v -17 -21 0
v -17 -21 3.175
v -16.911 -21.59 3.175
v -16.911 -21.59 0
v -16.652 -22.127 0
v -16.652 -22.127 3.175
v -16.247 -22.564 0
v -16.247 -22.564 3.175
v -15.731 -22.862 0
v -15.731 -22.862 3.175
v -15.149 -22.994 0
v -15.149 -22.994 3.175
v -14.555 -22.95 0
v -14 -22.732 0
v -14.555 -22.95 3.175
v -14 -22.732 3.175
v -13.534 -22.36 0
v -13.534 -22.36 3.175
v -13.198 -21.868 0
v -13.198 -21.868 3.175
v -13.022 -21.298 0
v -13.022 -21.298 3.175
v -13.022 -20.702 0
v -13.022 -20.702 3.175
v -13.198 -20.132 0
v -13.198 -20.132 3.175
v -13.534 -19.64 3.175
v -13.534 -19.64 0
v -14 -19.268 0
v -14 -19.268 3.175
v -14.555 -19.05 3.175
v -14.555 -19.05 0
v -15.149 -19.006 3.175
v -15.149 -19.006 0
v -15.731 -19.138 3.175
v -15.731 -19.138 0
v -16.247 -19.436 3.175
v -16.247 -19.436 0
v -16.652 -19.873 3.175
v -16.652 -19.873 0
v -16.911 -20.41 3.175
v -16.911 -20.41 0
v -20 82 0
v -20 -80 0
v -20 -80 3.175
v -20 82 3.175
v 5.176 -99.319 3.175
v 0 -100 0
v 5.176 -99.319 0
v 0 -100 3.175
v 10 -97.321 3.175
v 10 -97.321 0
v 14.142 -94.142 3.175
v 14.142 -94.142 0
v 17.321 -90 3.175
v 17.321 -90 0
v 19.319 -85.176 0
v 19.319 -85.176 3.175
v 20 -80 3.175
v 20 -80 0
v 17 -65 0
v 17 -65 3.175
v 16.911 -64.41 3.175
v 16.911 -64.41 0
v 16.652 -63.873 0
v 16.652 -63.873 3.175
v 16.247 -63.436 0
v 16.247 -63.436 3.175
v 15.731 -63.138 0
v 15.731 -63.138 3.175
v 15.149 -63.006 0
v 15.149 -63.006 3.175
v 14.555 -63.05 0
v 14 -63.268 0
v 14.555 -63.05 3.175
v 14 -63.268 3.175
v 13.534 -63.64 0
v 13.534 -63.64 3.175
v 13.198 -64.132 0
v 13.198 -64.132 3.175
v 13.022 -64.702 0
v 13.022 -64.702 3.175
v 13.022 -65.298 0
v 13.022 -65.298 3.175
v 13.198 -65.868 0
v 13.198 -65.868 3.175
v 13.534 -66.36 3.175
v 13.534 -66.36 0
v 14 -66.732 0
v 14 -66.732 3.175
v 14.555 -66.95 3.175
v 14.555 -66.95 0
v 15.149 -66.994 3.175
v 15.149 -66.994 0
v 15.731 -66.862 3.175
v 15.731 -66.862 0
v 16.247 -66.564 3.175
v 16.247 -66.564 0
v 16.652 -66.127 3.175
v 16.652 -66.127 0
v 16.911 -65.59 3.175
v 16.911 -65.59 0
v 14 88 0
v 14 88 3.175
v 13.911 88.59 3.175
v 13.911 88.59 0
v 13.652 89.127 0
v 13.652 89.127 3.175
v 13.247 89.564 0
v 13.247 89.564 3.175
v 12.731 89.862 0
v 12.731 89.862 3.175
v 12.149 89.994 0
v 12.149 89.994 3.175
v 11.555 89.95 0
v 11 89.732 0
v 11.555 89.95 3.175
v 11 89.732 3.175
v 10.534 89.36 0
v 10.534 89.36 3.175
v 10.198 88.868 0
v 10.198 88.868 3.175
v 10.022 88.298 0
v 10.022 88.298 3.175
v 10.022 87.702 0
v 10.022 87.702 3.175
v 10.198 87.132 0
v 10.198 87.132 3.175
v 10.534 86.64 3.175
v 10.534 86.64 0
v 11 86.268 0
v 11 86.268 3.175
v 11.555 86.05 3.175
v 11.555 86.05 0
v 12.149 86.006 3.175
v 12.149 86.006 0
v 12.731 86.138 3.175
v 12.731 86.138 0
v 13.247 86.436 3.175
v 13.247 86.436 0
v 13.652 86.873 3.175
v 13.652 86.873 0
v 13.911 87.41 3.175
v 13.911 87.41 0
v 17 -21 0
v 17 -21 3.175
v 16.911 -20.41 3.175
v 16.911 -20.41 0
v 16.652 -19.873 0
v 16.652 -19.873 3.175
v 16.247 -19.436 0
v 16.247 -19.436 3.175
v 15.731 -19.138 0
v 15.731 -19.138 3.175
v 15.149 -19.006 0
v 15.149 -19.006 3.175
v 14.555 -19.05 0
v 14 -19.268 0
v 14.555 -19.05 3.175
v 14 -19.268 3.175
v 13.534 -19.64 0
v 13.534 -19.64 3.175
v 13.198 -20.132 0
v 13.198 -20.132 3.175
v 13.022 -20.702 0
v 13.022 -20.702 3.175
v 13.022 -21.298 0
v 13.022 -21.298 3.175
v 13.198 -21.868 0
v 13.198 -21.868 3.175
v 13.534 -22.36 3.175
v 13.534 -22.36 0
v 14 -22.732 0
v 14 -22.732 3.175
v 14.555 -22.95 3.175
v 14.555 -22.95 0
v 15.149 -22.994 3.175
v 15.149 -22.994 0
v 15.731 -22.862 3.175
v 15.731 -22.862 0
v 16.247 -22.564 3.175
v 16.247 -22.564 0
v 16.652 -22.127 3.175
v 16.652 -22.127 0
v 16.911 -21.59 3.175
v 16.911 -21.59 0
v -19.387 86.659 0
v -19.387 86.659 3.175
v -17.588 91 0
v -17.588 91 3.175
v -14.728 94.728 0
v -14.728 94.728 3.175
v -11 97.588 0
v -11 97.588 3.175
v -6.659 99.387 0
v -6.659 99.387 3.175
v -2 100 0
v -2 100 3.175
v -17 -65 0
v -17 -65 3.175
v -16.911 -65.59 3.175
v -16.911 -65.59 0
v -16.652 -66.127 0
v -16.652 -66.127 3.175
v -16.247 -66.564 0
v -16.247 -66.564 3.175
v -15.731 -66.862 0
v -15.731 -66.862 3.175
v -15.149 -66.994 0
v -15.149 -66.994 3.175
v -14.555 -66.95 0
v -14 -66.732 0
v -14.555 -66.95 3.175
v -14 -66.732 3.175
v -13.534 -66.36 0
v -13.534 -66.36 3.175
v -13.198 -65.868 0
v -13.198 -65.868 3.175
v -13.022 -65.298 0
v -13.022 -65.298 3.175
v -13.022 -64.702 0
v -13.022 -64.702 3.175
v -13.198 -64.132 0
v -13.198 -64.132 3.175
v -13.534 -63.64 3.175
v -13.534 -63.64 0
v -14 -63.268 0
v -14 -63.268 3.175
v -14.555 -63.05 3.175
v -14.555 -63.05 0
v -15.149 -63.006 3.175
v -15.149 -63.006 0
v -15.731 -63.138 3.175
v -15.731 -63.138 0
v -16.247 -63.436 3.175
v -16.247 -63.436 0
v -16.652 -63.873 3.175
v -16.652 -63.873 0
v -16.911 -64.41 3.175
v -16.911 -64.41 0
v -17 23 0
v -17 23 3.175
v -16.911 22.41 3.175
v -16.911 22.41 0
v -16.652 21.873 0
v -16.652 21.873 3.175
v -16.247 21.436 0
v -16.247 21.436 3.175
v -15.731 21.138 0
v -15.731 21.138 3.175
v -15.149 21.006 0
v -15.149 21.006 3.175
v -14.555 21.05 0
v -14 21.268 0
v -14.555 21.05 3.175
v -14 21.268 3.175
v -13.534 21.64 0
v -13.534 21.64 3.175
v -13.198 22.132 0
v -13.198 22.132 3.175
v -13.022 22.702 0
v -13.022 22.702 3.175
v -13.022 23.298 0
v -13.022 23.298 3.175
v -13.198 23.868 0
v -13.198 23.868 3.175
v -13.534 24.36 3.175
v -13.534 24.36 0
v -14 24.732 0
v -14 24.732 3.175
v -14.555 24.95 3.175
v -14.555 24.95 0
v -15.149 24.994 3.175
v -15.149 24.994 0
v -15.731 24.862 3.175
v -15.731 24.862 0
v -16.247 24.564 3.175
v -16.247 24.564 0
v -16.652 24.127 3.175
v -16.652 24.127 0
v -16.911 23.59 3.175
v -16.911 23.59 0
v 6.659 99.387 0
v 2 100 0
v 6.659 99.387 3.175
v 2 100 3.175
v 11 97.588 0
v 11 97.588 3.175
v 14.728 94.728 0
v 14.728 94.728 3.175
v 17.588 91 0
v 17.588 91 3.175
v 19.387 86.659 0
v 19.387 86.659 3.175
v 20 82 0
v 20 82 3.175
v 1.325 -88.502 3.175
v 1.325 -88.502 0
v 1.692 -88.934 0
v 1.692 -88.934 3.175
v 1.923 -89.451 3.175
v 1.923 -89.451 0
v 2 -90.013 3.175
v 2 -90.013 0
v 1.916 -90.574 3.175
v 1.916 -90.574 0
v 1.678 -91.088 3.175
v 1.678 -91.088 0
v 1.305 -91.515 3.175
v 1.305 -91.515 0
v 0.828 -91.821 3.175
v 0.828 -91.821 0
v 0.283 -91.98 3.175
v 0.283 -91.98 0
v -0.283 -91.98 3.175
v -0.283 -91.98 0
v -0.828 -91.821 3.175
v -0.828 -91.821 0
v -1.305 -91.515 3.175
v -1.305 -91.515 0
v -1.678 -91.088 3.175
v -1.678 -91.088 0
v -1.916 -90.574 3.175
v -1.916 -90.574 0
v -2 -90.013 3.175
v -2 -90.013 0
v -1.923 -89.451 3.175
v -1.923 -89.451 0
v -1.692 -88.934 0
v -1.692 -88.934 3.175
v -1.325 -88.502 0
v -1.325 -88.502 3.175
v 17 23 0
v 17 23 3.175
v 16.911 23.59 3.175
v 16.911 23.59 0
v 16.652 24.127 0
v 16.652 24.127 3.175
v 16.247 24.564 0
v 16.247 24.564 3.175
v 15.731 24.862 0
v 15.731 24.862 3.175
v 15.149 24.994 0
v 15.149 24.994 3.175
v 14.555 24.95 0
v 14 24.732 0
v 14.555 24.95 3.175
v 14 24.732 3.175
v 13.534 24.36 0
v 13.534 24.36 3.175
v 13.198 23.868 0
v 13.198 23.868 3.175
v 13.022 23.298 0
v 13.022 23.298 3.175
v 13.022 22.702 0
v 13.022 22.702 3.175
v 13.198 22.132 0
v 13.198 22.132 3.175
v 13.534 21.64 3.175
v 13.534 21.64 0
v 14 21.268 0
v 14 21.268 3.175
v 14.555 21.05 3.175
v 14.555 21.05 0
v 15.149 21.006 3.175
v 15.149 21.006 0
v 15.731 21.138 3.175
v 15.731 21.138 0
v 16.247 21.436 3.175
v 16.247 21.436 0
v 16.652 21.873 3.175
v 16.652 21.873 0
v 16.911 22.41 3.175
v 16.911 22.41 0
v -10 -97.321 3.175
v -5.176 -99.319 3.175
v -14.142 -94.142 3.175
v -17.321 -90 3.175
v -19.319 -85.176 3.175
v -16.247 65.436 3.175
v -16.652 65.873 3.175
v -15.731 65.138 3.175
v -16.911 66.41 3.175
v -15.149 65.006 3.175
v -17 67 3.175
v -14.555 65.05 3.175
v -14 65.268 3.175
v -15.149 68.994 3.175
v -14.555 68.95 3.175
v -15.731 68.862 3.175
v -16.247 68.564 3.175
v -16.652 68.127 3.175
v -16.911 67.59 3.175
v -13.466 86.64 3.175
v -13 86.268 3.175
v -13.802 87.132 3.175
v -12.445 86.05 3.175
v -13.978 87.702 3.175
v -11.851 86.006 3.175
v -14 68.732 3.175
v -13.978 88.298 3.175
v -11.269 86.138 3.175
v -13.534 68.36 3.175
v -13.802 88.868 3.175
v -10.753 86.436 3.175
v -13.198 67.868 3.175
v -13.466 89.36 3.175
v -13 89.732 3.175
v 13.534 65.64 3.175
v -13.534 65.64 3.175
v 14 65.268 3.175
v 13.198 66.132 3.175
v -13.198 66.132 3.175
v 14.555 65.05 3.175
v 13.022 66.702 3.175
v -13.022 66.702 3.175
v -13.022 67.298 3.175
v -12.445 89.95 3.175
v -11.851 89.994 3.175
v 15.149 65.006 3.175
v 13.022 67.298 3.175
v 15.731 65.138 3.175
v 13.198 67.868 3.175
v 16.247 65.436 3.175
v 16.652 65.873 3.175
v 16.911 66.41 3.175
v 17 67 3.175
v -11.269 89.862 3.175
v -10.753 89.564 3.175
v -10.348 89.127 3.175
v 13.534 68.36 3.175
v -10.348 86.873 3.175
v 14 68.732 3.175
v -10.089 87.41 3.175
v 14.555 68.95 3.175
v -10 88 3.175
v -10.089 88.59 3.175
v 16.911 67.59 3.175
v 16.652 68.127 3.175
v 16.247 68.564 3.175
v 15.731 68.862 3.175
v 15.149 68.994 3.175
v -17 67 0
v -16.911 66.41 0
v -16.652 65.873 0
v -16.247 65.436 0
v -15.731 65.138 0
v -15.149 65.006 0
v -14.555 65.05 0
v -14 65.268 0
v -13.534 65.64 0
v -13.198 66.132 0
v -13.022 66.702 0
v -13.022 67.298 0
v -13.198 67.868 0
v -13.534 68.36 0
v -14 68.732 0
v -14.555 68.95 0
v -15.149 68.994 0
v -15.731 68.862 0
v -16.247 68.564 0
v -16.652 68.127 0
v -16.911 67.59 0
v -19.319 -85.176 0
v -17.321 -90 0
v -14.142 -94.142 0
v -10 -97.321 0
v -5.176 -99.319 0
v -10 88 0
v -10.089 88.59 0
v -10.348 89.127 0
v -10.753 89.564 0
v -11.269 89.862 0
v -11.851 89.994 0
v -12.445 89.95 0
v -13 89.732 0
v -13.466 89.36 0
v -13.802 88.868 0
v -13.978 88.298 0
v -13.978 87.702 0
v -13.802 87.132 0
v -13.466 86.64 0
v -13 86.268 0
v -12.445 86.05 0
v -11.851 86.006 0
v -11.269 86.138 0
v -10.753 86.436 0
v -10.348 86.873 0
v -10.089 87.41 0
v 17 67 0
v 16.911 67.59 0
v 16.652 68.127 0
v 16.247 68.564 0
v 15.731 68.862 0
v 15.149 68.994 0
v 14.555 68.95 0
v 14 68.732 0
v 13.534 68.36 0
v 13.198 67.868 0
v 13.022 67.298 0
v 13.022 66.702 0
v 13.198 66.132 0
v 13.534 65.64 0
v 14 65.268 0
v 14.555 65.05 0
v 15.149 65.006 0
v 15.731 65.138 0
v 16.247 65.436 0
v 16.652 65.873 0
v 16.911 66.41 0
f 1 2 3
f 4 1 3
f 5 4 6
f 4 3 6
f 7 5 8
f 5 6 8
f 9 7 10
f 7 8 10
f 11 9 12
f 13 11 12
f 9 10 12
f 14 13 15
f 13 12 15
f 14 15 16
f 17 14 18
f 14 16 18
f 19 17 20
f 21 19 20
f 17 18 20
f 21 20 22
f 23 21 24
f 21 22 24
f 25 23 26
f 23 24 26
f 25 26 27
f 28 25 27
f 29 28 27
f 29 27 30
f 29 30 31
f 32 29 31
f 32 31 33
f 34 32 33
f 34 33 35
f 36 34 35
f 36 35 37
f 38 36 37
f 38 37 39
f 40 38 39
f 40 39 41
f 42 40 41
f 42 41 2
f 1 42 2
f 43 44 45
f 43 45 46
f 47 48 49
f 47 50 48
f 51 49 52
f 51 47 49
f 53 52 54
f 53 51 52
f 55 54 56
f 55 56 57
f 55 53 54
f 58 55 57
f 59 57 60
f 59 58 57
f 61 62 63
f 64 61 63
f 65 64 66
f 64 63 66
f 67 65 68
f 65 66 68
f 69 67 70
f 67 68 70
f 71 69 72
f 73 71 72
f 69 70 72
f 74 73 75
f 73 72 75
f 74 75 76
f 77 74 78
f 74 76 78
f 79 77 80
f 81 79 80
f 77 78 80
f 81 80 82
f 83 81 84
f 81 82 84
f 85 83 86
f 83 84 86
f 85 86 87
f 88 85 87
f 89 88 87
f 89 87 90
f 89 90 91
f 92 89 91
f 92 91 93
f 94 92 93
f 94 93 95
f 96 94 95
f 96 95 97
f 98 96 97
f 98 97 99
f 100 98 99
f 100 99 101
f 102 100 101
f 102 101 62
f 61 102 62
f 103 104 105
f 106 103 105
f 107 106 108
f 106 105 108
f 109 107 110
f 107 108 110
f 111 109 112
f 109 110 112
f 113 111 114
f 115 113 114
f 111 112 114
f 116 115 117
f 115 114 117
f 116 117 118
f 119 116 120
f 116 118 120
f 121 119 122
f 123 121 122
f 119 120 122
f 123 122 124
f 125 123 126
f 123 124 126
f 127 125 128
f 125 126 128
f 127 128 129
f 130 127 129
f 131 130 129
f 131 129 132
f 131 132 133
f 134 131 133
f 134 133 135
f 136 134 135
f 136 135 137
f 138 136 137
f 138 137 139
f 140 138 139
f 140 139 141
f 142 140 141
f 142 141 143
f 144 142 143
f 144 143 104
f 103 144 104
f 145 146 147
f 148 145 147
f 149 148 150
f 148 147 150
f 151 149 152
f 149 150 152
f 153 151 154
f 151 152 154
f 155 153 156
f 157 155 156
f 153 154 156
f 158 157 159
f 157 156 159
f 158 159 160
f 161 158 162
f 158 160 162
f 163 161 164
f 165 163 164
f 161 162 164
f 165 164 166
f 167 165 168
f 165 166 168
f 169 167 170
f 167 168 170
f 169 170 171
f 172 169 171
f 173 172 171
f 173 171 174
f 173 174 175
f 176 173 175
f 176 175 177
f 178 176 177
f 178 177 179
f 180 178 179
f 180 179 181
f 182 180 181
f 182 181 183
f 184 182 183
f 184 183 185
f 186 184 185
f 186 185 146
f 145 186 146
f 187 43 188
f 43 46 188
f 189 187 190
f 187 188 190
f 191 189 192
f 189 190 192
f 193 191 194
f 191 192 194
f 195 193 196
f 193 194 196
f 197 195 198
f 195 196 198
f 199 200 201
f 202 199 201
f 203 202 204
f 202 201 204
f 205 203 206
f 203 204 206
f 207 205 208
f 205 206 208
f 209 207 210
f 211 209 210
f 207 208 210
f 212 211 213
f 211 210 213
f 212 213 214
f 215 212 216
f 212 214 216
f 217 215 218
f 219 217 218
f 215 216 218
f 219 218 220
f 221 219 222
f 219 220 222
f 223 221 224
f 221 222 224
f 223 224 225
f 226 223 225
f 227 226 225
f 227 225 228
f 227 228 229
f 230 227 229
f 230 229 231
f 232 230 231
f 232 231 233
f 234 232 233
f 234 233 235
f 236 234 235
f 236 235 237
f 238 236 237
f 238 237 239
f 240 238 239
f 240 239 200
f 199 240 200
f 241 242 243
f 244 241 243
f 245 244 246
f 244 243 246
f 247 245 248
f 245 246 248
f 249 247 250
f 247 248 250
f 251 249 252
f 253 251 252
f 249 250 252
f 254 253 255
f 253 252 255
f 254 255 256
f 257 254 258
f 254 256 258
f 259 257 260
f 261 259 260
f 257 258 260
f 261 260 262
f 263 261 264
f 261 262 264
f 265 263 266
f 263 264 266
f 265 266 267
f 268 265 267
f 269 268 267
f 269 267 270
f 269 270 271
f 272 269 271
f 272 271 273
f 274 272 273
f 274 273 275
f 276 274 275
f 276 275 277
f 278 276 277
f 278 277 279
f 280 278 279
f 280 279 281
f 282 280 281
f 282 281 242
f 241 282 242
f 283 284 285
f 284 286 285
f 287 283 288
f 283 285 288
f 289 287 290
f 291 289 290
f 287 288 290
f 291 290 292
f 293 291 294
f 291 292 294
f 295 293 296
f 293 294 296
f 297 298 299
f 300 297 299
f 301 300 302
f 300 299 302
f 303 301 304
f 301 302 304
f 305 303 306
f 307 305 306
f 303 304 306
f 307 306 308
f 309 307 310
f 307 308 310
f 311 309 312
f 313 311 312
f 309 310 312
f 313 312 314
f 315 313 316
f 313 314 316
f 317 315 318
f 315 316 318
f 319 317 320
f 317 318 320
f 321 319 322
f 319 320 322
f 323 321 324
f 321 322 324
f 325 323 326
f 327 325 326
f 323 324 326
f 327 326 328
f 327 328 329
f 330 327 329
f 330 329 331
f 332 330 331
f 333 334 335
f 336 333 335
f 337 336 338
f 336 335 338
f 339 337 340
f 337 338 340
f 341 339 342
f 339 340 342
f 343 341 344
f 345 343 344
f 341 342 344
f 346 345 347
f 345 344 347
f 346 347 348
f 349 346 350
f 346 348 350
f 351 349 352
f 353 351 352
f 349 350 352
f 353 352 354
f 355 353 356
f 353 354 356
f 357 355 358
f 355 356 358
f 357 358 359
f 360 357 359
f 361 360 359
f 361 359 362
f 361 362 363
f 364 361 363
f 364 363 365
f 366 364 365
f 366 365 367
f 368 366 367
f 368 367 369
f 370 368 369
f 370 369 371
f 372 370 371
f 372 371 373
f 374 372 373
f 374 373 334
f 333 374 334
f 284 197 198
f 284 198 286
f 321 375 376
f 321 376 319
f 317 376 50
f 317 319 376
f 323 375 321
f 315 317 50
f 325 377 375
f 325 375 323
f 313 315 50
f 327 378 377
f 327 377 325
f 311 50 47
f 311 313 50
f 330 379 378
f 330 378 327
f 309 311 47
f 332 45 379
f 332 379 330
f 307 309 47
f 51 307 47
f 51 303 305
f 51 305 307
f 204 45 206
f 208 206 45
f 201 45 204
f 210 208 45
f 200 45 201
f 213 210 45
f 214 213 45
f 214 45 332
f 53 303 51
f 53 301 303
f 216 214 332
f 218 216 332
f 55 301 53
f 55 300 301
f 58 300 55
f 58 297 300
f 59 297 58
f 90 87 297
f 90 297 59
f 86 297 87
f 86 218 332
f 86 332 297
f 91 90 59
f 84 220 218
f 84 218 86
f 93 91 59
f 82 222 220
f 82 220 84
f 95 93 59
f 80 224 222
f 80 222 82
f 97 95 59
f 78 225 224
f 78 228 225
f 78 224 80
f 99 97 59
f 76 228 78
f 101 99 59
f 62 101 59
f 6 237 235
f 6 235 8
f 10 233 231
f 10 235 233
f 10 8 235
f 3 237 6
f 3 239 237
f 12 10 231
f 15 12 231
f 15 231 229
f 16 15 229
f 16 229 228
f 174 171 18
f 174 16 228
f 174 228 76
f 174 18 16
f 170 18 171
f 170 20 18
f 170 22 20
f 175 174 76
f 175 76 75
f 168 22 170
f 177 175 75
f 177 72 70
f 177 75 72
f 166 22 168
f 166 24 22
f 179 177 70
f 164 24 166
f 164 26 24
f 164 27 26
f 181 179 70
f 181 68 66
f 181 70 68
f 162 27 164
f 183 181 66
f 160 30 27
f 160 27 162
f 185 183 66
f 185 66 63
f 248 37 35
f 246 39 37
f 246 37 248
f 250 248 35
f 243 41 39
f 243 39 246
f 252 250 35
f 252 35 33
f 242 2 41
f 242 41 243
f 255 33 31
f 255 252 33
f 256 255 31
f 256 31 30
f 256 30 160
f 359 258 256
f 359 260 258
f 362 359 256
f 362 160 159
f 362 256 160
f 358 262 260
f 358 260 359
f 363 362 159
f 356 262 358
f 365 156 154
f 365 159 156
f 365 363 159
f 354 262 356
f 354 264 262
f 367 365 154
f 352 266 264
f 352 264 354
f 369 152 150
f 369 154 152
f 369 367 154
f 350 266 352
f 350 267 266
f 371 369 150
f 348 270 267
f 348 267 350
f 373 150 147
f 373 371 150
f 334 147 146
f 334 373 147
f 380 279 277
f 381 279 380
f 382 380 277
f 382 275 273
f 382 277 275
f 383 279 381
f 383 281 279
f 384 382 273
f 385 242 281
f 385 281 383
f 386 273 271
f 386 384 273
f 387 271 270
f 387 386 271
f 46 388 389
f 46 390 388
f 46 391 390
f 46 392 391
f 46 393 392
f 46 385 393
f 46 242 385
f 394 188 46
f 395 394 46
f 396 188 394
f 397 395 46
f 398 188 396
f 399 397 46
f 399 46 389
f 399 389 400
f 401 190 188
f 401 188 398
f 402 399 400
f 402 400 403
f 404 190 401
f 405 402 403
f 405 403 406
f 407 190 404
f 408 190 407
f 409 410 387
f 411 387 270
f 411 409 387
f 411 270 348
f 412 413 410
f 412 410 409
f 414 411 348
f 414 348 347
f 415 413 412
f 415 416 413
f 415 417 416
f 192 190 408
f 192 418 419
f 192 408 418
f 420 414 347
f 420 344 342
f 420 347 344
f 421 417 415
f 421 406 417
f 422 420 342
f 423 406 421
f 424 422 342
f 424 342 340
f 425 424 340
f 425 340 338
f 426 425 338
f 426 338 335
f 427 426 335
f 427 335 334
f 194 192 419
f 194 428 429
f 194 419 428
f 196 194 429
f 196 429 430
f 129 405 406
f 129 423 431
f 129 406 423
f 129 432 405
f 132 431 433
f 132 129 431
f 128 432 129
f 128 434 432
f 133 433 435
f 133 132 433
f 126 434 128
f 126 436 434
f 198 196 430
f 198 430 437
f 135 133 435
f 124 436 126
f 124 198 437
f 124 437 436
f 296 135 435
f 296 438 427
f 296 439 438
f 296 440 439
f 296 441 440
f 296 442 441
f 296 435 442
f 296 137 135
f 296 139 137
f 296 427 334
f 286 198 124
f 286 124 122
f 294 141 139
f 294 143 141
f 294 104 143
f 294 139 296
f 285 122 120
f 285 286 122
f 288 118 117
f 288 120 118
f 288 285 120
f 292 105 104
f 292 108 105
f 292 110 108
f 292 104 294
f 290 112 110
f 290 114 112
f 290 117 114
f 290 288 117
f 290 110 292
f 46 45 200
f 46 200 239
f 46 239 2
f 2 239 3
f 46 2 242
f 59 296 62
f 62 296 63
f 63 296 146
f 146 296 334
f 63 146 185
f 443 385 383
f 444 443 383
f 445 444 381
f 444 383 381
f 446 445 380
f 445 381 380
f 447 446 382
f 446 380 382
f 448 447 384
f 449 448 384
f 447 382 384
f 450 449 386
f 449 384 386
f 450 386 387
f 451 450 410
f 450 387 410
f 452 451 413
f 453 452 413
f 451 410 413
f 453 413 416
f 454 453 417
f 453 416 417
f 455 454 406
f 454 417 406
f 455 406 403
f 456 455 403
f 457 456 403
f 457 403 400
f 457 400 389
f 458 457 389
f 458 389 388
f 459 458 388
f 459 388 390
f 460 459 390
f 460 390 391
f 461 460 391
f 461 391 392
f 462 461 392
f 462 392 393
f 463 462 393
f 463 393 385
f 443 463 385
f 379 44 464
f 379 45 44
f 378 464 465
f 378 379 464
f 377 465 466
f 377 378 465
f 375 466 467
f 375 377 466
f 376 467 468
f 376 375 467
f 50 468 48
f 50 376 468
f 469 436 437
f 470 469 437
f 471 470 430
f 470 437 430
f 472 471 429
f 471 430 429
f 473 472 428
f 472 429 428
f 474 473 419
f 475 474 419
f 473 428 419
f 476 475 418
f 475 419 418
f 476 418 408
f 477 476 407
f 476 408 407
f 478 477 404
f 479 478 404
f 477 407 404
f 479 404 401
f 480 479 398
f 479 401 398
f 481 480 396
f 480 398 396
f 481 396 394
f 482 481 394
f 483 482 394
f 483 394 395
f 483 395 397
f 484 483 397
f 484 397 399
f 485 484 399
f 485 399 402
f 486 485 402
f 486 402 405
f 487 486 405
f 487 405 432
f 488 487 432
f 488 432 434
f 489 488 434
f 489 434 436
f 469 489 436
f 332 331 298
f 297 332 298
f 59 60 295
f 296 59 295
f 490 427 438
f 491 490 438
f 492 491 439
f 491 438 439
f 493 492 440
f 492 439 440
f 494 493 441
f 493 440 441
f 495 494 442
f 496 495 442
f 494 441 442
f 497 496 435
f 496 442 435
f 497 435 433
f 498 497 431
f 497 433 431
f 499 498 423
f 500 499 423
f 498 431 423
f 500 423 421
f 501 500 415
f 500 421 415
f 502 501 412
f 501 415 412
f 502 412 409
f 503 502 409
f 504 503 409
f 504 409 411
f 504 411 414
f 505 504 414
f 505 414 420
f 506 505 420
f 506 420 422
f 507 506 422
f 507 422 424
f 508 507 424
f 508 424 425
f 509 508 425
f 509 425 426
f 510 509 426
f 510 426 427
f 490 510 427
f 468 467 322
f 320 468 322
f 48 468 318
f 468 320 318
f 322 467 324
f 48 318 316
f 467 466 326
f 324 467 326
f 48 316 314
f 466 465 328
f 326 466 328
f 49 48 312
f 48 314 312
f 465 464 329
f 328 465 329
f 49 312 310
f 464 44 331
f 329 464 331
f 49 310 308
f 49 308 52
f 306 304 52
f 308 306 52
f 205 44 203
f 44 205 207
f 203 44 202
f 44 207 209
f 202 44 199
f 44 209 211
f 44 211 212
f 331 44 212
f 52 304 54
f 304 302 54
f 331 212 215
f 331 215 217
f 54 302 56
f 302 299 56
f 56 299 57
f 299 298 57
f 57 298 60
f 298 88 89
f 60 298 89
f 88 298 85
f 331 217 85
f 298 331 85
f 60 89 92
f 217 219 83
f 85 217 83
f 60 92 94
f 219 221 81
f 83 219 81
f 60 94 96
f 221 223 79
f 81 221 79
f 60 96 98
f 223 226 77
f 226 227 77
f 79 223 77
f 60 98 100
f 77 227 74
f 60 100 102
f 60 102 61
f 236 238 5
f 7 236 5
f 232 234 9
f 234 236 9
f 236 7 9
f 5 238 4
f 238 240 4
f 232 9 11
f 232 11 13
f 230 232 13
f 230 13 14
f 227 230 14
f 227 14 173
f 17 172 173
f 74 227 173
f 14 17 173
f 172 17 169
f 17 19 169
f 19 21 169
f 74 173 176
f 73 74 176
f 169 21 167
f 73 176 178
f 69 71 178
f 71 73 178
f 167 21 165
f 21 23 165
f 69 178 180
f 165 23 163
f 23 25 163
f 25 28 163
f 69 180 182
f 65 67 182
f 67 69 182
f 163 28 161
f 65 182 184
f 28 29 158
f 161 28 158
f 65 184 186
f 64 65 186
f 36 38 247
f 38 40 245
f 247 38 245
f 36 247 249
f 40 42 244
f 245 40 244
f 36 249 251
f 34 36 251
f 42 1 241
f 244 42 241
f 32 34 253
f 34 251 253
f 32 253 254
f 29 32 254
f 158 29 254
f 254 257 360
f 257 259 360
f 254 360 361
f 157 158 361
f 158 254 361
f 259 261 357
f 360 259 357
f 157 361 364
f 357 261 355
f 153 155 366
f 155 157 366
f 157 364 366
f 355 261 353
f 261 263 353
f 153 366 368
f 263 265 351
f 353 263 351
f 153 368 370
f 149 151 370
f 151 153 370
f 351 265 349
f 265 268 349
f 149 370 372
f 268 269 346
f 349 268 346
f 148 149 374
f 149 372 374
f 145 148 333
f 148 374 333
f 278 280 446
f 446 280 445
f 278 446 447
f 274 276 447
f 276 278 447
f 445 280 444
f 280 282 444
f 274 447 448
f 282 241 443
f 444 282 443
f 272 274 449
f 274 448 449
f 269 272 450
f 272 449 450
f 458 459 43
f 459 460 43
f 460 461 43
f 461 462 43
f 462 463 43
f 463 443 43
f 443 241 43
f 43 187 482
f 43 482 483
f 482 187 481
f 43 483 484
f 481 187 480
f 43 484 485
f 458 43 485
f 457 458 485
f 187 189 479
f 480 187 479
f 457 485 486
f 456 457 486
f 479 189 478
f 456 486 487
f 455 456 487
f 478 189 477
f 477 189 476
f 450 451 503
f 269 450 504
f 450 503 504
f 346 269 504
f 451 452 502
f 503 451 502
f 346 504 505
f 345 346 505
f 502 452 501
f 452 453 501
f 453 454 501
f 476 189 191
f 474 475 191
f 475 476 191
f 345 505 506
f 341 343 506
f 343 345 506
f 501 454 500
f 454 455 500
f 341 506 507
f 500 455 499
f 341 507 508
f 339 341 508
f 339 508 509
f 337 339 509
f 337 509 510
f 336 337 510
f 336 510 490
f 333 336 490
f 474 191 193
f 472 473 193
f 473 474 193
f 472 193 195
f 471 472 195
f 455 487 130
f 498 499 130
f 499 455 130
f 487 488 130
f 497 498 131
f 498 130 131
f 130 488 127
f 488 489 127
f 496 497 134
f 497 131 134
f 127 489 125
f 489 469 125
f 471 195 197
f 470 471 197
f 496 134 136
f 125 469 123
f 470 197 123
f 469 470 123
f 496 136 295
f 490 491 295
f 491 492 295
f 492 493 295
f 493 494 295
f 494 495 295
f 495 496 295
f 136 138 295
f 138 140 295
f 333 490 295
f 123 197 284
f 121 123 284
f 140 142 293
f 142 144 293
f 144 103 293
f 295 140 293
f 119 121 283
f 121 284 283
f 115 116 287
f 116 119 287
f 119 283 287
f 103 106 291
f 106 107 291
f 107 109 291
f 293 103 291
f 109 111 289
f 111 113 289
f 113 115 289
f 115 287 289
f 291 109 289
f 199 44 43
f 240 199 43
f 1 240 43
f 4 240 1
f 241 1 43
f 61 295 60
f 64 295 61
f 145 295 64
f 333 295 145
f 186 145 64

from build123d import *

# Parameters (mm, degrees)
SKETCH2_W           = 40
SKETCH2_H           = 200
BOSS_EXTRUDE1_DEPTH = 3.175
CUT_EXTRUDE1_DEPTH  = 10
FILLET1_R           = 20
FILLET2_R           = 18
SKETCH6_R           = 2
CUT_EXTRUDE4_DEPTH  = 103.029802631
SKETCH7_R           = 2
CUT_EXTRUDE5_DEPTH  = 103.029802631


with BuildPart() as part:
    # Sketch2 → Boss-Extrude1 (new body)
    with BuildSketch(Plane.XY):
        Rectangle(SKETCH2_W, SKETCH2_H)
    extrude(amount=BOSS_EXTRUDE1_DEPTH)

    # Sketch3 → Cut-Extrude1 (cut)
    with BuildSketch(Plane(origin=(0, 0, 0), x_dir=(-1, 0, 0), z_dir=(0, 0, -1))):
        with BuildLine():
            Line((1.325, -88.501876173), (-1.325, -88.501876173))
            ThreePointArc((-1.325, -88.501876173), (0, -92), (1.325, -88.501876173))
        make_face()
    extrude(amount=-CUT_EXTRUDE1_DEPTH, mode=Mode.SUBTRACT)

    # Fillet1
    fillet1_edges = [part.edges().sort_by_distance(p)[0] for p in [
        (20, -100, 1.5875),
        (-20, -100, 1.5875),
    ]]
    fillet(fillet1_edges, radius=FILLET1_R - 0.0001)  # a hair under: the kernel refuses the full size

    # Fillet2
    fillet2_edges = [part.edges().sort_by_distance(p)[0] for p in [
        (-20, 100, 1.5875),
        (20, 100, 1.5875),
    ]]
    fillet(fillet2_edges, radius=FILLET2_R)

    # Sketch6 → Cut-Extrude4 (cut, through all)
    with BuildSketch(Plane.XY.offset(3.175)):
        with Locations((15, 67)):
            Circle(SKETCH6_R)
        with Locations((15, -21)):
            Circle(SKETCH6_R)
        with Locations((15, 23)):
            Circle(SKETCH6_R)
        with Locations((15, -65)):
            Circle(SKETCH6_R)
        with Locations(Location((-15, -65, 0), (0, 0, 180))):
            Circle(SKETCH6_R)
        with Locations(Location((-15, 23, 0), (0, 0, 180))):
            Circle(SKETCH6_R)
        with Locations(Location((-15, -21, 0), (0, 0, 180))):
            Circle(SKETCH6_R)
        with Locations(Location((-15, 67, 0), (0, 0, 180))):
            Circle(SKETCH6_R)
    extrude(amount=-CUT_EXTRUDE4_DEPTH, mode=Mode.SUBTRACT)

    # Sketch7 → Cut-Extrude5 (cut, through all)
    with BuildSketch(Plane.XY.offset(3.175)):
        with Locations((-12, 88)):
            Circle(SKETCH7_R)
        with Locations((12, 88)):
            Circle(SKETCH7_R)
    extrude(amount=-CUT_EXTRUDE5_DEPTH, mode=Mode.SUBTRACT)


solid = part.part
